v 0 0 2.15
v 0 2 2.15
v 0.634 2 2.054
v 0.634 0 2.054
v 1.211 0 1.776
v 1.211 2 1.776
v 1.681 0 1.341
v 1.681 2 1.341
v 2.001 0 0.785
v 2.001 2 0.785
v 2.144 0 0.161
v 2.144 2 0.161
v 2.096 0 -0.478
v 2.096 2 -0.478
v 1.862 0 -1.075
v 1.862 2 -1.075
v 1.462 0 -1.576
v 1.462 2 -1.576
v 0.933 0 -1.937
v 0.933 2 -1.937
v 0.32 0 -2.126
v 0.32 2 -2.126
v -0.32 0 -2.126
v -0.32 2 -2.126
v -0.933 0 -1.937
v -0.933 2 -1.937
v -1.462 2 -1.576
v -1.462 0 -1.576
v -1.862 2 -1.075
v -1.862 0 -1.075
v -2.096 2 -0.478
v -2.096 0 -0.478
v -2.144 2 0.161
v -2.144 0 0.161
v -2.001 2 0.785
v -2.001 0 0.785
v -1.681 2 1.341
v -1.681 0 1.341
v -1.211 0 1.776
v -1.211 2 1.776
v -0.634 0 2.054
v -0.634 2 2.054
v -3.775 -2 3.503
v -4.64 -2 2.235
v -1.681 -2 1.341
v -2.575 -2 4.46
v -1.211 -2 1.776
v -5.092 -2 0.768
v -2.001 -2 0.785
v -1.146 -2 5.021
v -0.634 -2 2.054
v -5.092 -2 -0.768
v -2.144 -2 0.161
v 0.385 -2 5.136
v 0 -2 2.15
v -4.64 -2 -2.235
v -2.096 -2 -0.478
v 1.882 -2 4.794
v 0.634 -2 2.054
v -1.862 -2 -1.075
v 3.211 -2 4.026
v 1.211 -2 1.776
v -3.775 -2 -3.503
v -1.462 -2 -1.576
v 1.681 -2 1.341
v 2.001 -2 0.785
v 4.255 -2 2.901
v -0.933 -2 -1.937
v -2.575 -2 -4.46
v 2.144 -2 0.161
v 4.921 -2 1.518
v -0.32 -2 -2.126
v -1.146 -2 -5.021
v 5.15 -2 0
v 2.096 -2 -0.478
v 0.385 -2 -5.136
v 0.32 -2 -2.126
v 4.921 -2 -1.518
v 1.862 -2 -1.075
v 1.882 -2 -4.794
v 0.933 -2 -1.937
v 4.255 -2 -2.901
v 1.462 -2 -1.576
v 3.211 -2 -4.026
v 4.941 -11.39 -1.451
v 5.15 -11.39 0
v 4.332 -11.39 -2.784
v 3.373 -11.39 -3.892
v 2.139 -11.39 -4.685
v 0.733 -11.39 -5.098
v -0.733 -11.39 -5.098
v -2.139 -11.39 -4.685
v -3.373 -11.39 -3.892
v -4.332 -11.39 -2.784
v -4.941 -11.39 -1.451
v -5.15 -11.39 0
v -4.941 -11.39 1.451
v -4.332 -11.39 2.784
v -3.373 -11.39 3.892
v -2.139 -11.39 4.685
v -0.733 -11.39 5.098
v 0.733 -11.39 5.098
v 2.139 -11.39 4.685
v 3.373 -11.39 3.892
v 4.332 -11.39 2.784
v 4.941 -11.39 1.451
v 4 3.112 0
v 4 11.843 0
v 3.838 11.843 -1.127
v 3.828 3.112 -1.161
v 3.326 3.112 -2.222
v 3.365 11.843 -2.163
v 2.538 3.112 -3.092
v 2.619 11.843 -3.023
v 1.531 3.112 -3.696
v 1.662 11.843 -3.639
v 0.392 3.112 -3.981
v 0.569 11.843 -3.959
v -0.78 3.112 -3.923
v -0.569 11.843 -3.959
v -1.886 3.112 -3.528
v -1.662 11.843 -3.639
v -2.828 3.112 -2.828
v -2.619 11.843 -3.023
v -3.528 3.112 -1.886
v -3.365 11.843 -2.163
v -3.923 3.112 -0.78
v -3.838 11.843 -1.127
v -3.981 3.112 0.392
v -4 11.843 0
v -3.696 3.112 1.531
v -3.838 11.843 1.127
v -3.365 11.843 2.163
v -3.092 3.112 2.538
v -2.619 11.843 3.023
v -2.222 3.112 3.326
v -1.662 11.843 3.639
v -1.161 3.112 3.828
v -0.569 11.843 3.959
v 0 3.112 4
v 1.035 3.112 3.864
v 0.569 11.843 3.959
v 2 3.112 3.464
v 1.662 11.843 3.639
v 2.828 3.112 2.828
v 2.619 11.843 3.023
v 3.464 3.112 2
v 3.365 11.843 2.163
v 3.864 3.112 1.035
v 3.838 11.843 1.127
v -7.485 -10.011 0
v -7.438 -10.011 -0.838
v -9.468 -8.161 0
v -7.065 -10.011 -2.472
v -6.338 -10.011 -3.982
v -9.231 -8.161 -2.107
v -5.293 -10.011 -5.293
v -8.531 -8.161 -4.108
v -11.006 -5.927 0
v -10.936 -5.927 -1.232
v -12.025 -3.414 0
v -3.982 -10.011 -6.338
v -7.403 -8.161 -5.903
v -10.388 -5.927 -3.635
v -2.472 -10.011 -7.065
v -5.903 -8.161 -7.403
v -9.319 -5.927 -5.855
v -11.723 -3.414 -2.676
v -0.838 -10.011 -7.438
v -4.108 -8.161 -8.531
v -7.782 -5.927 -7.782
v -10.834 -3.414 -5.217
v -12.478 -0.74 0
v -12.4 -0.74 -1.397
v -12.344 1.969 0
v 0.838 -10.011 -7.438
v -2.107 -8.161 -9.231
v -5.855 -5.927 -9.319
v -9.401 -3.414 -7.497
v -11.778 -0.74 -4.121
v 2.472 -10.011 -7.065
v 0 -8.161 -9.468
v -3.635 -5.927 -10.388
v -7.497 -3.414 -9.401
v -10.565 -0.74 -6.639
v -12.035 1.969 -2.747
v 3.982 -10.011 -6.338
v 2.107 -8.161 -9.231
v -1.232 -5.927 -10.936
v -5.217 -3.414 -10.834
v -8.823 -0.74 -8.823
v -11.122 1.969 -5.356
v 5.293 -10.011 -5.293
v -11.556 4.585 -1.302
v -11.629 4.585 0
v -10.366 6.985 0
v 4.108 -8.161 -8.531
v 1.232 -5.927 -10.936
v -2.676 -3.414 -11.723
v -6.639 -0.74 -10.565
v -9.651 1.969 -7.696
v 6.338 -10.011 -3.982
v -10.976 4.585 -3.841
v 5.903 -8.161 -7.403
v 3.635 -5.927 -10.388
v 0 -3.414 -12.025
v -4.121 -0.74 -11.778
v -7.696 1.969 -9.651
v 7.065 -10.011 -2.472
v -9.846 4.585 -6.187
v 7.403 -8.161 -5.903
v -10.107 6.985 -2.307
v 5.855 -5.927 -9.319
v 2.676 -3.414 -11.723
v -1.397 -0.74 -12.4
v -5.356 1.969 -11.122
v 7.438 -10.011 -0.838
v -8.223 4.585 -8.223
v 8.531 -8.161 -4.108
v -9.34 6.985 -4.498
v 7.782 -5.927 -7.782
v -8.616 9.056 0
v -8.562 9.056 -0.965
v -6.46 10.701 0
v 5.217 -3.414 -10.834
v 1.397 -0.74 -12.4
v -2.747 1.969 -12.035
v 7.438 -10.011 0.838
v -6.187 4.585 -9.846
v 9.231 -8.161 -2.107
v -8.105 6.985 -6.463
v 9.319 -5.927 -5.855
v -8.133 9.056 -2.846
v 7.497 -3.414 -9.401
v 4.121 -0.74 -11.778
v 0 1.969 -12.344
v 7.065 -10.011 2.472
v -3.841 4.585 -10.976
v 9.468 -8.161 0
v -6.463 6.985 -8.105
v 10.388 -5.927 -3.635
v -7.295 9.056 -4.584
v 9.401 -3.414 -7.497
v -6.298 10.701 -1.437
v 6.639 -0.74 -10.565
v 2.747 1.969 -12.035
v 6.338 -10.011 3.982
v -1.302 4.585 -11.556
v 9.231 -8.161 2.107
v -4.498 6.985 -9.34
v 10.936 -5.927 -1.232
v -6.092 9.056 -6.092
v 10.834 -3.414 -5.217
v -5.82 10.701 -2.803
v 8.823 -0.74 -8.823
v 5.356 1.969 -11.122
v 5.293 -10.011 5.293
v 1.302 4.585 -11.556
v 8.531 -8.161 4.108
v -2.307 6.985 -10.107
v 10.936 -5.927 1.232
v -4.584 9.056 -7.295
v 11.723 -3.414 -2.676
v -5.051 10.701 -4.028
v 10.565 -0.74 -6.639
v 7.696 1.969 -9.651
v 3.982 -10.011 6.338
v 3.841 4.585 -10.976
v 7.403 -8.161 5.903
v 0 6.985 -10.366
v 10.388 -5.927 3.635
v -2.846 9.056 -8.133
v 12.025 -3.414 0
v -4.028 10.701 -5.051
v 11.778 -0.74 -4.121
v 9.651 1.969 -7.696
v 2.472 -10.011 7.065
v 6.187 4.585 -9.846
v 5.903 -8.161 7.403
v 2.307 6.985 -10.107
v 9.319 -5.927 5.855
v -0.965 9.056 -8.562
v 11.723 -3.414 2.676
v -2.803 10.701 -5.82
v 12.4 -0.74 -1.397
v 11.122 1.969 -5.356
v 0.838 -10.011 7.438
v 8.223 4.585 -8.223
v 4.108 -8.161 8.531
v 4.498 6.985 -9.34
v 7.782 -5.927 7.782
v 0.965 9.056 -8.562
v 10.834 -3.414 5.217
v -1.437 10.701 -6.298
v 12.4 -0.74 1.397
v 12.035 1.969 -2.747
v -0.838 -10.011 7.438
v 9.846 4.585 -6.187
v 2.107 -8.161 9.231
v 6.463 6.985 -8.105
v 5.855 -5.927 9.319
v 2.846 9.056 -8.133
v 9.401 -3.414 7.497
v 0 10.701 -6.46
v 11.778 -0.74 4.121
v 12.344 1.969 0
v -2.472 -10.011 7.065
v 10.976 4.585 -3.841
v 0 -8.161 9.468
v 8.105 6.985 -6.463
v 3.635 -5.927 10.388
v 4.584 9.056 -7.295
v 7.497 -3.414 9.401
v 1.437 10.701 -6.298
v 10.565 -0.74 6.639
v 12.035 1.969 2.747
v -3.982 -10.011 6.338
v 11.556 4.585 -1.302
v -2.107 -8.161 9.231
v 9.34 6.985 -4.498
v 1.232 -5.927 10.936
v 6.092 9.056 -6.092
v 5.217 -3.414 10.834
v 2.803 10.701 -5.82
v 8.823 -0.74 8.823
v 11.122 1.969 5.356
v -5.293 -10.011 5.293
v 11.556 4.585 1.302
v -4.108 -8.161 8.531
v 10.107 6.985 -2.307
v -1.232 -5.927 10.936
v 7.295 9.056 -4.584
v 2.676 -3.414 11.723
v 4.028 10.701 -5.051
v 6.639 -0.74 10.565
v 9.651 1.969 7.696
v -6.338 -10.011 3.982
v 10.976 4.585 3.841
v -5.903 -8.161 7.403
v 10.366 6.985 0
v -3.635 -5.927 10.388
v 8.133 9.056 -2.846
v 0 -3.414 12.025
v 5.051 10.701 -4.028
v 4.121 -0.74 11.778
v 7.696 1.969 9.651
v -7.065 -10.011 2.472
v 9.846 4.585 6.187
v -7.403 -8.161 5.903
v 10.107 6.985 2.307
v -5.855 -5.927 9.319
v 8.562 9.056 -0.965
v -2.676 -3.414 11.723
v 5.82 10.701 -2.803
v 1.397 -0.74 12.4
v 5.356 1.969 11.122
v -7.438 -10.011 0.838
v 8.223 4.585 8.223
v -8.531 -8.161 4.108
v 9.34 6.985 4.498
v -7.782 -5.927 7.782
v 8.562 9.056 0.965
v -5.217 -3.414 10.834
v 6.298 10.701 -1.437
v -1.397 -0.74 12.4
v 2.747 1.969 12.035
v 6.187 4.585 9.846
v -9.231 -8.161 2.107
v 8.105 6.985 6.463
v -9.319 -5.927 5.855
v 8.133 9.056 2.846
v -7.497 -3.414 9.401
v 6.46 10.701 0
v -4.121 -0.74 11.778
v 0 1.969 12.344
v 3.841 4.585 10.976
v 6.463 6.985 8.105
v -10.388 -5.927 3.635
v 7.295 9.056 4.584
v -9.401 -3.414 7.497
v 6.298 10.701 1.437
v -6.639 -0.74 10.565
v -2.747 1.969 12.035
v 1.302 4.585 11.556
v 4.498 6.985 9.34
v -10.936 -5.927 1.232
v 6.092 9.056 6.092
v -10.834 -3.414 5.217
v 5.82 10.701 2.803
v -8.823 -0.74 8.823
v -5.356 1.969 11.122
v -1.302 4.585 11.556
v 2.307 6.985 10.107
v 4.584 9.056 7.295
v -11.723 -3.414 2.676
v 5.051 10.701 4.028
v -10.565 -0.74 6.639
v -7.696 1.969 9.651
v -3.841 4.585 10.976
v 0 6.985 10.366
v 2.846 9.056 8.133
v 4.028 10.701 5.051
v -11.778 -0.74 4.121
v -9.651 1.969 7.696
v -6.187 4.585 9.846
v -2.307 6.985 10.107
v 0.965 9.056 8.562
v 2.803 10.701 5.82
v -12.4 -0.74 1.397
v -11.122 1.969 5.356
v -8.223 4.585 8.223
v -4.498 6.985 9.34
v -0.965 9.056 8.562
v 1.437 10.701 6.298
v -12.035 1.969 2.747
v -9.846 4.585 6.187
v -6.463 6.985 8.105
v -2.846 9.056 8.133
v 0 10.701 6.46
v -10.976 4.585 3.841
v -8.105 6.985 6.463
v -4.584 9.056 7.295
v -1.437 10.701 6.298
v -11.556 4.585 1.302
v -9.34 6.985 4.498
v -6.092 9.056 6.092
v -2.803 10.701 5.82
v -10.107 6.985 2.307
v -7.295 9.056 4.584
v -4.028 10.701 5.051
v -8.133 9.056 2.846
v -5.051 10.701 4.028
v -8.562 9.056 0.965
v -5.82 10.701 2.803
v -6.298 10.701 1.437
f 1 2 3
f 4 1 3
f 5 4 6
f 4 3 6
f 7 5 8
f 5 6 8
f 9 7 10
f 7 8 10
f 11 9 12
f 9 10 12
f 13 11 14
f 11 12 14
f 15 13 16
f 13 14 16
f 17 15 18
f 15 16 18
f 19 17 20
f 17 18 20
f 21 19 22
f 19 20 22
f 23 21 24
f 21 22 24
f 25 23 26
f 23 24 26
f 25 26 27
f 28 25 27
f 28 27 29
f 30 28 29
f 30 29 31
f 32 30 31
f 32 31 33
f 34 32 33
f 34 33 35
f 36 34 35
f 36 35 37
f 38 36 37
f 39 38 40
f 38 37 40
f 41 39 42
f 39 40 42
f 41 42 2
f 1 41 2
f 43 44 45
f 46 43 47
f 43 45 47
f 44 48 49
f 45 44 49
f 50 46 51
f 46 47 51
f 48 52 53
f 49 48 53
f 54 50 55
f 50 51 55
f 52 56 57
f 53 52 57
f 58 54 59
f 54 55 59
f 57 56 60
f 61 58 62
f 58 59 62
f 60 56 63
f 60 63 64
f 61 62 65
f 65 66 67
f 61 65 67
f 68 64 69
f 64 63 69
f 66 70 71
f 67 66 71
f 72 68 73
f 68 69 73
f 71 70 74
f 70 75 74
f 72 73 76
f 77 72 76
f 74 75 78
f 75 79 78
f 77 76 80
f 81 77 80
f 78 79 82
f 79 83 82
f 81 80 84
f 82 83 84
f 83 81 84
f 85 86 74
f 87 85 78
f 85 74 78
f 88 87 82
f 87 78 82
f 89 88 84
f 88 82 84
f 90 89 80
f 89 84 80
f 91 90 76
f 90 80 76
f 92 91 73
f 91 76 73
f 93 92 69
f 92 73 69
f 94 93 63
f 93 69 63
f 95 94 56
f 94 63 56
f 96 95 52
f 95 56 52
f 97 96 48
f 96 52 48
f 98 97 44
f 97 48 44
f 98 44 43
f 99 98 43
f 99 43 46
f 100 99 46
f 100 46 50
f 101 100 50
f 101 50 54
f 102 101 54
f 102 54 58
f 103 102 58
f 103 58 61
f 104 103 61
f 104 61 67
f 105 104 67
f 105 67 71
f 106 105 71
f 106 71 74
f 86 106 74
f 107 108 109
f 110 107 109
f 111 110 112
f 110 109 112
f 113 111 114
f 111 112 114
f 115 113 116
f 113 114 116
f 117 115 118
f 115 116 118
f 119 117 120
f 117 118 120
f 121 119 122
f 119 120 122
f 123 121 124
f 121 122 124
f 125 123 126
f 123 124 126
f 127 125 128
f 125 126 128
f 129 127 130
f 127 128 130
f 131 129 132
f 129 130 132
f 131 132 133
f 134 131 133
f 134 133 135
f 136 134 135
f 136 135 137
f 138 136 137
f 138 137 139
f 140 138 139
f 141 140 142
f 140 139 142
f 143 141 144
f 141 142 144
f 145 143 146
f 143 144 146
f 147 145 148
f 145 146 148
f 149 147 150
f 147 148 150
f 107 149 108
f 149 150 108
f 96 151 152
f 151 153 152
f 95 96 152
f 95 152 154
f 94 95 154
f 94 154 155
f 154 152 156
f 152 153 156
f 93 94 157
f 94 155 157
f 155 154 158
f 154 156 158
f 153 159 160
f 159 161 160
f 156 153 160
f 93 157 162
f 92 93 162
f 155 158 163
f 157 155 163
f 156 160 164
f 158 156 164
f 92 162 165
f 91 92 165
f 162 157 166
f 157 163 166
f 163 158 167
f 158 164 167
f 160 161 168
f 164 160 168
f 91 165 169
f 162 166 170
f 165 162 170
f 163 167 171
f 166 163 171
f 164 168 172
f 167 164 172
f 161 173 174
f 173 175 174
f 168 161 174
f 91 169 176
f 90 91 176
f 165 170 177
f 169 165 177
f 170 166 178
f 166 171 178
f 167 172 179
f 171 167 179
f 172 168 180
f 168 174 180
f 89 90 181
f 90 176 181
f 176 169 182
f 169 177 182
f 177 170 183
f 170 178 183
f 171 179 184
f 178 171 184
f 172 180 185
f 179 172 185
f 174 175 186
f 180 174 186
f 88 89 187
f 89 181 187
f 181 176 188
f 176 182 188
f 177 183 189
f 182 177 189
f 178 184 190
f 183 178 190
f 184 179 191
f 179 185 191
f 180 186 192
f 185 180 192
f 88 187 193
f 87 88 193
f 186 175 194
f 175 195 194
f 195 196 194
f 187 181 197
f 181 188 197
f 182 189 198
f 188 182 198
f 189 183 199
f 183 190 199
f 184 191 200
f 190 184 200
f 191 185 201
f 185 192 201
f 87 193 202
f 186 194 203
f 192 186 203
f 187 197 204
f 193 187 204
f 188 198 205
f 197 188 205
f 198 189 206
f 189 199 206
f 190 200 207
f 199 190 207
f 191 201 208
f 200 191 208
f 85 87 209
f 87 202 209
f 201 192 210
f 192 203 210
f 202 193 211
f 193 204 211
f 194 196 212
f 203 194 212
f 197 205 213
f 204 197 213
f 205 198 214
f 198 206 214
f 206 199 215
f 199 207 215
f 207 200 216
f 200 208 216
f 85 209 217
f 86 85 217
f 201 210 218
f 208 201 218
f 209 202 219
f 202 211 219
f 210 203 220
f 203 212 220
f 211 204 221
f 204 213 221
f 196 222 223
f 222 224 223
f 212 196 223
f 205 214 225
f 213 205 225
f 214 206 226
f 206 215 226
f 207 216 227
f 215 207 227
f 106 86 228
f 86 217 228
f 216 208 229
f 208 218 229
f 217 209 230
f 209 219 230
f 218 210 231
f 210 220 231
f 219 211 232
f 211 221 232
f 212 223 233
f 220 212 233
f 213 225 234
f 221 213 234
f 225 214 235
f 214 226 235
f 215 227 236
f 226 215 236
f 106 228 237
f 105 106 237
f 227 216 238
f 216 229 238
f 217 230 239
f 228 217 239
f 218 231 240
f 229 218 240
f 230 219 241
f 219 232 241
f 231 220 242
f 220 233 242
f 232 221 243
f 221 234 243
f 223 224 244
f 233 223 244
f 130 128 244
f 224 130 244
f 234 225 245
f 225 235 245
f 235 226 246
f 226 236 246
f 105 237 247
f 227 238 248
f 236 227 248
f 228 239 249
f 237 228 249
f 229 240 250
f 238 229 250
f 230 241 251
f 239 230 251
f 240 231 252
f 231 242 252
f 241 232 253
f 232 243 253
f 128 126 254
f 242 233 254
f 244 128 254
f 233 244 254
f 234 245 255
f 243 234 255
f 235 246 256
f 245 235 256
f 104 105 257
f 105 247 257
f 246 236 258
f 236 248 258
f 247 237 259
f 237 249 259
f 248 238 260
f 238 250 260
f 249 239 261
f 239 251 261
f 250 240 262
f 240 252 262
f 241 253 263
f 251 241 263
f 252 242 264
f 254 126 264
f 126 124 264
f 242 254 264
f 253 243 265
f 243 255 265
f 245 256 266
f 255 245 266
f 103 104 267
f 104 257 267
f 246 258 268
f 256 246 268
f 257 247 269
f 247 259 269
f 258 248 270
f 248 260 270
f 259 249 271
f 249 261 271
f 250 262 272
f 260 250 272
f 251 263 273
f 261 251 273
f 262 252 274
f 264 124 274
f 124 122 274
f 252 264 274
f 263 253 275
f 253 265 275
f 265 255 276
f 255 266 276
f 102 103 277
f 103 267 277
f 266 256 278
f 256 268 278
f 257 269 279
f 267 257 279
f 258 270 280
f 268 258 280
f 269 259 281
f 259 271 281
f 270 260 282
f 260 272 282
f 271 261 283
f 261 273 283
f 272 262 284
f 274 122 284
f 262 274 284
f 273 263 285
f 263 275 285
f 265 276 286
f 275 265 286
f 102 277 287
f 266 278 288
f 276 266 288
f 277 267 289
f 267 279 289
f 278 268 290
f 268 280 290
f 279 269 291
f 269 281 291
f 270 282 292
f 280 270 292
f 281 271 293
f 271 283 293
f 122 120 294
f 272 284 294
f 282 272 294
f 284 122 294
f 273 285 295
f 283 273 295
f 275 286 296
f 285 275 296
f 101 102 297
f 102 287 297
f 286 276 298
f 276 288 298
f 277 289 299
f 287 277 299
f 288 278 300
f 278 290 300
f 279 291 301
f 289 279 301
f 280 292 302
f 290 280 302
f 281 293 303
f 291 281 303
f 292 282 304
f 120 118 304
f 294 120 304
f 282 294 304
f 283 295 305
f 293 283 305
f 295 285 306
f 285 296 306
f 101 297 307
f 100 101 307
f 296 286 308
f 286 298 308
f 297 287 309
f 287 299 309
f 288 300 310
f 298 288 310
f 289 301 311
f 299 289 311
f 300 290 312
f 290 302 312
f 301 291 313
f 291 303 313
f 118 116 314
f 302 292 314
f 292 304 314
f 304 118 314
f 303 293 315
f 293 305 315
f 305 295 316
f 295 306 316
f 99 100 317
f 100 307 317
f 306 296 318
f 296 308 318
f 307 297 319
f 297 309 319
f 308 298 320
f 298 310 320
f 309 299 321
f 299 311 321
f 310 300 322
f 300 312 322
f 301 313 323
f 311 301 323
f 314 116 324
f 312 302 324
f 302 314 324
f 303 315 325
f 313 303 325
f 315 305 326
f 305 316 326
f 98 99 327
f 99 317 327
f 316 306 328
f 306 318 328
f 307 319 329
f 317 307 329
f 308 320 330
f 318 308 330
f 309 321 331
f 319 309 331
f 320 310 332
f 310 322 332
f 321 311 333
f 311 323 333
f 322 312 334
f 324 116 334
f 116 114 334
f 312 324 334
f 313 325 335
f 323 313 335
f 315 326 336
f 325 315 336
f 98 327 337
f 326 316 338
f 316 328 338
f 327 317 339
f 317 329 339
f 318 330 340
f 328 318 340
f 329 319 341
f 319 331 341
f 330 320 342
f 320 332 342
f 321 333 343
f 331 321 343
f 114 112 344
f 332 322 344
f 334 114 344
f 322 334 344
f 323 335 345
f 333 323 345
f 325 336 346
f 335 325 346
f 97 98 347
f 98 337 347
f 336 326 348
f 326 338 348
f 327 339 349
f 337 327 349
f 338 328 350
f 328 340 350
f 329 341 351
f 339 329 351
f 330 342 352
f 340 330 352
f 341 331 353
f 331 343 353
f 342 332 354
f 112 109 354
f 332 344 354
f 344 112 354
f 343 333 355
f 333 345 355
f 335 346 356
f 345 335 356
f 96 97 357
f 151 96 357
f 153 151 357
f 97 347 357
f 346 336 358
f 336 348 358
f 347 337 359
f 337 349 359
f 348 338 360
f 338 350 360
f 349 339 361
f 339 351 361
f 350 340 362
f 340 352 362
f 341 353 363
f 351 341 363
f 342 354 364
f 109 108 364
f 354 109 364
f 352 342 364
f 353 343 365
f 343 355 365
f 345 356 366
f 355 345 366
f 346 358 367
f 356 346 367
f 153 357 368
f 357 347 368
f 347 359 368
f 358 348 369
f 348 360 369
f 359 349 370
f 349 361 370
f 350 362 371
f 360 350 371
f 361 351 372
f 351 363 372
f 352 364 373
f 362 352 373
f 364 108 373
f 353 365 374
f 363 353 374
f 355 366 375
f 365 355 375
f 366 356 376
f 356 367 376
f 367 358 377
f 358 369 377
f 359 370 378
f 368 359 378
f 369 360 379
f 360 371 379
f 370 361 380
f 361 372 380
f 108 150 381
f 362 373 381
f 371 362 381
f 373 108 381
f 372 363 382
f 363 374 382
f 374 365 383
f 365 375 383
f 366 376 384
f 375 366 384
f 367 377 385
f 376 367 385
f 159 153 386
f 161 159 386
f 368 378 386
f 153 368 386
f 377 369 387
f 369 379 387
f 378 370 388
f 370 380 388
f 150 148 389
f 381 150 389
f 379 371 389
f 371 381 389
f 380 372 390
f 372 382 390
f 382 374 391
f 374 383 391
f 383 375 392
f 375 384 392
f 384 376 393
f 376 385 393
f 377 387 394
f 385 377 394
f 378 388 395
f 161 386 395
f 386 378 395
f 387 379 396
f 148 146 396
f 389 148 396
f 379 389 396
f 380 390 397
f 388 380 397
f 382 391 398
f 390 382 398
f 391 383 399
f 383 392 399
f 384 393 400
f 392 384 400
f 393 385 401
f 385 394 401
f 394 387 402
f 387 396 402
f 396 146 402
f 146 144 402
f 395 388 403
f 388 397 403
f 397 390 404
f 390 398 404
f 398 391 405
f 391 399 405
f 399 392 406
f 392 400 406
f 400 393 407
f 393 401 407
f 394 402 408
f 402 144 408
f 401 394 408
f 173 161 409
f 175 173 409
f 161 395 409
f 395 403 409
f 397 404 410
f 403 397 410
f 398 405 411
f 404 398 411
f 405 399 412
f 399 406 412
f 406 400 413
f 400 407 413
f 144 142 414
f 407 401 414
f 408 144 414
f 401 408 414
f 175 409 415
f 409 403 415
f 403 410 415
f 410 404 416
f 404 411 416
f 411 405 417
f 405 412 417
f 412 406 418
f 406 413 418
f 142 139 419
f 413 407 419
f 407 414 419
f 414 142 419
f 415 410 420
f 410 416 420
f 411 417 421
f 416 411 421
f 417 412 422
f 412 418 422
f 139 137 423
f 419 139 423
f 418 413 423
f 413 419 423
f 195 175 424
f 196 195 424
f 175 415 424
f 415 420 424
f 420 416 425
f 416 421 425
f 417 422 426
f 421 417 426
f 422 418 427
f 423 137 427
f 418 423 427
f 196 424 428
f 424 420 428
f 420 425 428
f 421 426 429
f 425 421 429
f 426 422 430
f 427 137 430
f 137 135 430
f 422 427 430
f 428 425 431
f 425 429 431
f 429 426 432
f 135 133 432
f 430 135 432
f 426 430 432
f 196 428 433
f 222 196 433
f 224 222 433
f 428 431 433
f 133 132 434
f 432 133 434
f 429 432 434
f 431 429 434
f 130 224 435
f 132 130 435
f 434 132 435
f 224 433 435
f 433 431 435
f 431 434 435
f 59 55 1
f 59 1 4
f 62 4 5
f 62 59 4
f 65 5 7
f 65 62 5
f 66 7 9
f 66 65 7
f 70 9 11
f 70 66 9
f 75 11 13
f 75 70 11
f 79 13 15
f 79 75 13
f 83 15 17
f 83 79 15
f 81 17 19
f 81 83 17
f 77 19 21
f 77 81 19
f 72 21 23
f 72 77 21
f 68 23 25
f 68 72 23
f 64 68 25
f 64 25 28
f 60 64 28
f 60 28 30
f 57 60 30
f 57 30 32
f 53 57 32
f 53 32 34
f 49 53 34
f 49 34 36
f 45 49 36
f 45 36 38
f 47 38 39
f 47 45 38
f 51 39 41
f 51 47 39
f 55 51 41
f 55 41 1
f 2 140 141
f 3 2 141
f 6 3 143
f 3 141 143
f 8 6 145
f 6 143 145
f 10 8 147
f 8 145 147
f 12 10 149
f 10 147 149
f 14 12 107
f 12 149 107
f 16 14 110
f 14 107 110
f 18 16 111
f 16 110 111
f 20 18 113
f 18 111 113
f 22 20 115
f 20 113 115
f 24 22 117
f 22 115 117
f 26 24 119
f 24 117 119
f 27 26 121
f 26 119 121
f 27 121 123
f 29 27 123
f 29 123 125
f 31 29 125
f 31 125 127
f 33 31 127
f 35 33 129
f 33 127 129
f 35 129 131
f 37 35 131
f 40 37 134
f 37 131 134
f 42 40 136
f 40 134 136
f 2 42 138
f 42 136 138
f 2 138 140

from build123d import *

# Parameters (mm, degrees)
SKIZZE3_R                       = 4
SCHNITT_LINEAR_AUSTRAGEN1_DEPTH = 20
SCHNITT_LINEAR_START            = -2
SKIZZE6_R                       = 5.15
SCHNITT_LINEAR_AUSTRAGEN2_DEPTH = 10.842719282


with BuildPart() as part:
    # Skizze1 → Rotation1 (revolve)
    with BuildSketch(Plane.XY):
        with BuildLine():
            Line((0, 12.5), (0, -12.5))
            ThreePointArc((0, -12.5), (-12.5, 0), (0, 12.5))
        make_face()
    revolve(axis=Axis((0, 27.42628623, 0), (0, -1, 0)))

    # Skizze3 → Schnitt-Linear austragen1 (cut, symmetric)
    with BuildSketch(Plane(origin=(0, 0, 0), x_dir=(1, 0, 0), z_dir=(0, 1, 0))):
        Circle(SKIZZE3_R)
    extrude(amount=SCHNITT_LINEAR_AUSTRAGEN1_DEPTH, both=True, mode=Mode.SUBTRACT)

    # Skizze5 → Rotation2 (revolve)
    with BuildSketch(Plane(origin=(0, 0, 0), x_dir=(0, 0, -1), z_dir=(1, 0, 0))):
        Polygon((-2.15, 0), (-2.15, 2), (-5, 3.712452764), (-5, 0), align=None)
    rotation2 = revolve(axis=Axis((0, 0, 0), (0, 1, 0)))

    # Spiegeln1: Rotation2 across plane
    add(rotation2.mirror(Plane.ZX))

    # Skizze6 → Schnitt-Linear austragen2 (cut, through all)
    with BuildSketch(Plane(origin=(0, 0, 0), x_dir=(1, 0, 0), z_dir=(0, 1, 0)).offset(SCHNITT_LINEAR_START)):
        Circle(SKIZZE6_R)
    extrude(amount=-SCHNITT_LINEAR_AUSTRAGEN2_DEPTH, mode=Mode.SUBTRACT)


solid = part.part
